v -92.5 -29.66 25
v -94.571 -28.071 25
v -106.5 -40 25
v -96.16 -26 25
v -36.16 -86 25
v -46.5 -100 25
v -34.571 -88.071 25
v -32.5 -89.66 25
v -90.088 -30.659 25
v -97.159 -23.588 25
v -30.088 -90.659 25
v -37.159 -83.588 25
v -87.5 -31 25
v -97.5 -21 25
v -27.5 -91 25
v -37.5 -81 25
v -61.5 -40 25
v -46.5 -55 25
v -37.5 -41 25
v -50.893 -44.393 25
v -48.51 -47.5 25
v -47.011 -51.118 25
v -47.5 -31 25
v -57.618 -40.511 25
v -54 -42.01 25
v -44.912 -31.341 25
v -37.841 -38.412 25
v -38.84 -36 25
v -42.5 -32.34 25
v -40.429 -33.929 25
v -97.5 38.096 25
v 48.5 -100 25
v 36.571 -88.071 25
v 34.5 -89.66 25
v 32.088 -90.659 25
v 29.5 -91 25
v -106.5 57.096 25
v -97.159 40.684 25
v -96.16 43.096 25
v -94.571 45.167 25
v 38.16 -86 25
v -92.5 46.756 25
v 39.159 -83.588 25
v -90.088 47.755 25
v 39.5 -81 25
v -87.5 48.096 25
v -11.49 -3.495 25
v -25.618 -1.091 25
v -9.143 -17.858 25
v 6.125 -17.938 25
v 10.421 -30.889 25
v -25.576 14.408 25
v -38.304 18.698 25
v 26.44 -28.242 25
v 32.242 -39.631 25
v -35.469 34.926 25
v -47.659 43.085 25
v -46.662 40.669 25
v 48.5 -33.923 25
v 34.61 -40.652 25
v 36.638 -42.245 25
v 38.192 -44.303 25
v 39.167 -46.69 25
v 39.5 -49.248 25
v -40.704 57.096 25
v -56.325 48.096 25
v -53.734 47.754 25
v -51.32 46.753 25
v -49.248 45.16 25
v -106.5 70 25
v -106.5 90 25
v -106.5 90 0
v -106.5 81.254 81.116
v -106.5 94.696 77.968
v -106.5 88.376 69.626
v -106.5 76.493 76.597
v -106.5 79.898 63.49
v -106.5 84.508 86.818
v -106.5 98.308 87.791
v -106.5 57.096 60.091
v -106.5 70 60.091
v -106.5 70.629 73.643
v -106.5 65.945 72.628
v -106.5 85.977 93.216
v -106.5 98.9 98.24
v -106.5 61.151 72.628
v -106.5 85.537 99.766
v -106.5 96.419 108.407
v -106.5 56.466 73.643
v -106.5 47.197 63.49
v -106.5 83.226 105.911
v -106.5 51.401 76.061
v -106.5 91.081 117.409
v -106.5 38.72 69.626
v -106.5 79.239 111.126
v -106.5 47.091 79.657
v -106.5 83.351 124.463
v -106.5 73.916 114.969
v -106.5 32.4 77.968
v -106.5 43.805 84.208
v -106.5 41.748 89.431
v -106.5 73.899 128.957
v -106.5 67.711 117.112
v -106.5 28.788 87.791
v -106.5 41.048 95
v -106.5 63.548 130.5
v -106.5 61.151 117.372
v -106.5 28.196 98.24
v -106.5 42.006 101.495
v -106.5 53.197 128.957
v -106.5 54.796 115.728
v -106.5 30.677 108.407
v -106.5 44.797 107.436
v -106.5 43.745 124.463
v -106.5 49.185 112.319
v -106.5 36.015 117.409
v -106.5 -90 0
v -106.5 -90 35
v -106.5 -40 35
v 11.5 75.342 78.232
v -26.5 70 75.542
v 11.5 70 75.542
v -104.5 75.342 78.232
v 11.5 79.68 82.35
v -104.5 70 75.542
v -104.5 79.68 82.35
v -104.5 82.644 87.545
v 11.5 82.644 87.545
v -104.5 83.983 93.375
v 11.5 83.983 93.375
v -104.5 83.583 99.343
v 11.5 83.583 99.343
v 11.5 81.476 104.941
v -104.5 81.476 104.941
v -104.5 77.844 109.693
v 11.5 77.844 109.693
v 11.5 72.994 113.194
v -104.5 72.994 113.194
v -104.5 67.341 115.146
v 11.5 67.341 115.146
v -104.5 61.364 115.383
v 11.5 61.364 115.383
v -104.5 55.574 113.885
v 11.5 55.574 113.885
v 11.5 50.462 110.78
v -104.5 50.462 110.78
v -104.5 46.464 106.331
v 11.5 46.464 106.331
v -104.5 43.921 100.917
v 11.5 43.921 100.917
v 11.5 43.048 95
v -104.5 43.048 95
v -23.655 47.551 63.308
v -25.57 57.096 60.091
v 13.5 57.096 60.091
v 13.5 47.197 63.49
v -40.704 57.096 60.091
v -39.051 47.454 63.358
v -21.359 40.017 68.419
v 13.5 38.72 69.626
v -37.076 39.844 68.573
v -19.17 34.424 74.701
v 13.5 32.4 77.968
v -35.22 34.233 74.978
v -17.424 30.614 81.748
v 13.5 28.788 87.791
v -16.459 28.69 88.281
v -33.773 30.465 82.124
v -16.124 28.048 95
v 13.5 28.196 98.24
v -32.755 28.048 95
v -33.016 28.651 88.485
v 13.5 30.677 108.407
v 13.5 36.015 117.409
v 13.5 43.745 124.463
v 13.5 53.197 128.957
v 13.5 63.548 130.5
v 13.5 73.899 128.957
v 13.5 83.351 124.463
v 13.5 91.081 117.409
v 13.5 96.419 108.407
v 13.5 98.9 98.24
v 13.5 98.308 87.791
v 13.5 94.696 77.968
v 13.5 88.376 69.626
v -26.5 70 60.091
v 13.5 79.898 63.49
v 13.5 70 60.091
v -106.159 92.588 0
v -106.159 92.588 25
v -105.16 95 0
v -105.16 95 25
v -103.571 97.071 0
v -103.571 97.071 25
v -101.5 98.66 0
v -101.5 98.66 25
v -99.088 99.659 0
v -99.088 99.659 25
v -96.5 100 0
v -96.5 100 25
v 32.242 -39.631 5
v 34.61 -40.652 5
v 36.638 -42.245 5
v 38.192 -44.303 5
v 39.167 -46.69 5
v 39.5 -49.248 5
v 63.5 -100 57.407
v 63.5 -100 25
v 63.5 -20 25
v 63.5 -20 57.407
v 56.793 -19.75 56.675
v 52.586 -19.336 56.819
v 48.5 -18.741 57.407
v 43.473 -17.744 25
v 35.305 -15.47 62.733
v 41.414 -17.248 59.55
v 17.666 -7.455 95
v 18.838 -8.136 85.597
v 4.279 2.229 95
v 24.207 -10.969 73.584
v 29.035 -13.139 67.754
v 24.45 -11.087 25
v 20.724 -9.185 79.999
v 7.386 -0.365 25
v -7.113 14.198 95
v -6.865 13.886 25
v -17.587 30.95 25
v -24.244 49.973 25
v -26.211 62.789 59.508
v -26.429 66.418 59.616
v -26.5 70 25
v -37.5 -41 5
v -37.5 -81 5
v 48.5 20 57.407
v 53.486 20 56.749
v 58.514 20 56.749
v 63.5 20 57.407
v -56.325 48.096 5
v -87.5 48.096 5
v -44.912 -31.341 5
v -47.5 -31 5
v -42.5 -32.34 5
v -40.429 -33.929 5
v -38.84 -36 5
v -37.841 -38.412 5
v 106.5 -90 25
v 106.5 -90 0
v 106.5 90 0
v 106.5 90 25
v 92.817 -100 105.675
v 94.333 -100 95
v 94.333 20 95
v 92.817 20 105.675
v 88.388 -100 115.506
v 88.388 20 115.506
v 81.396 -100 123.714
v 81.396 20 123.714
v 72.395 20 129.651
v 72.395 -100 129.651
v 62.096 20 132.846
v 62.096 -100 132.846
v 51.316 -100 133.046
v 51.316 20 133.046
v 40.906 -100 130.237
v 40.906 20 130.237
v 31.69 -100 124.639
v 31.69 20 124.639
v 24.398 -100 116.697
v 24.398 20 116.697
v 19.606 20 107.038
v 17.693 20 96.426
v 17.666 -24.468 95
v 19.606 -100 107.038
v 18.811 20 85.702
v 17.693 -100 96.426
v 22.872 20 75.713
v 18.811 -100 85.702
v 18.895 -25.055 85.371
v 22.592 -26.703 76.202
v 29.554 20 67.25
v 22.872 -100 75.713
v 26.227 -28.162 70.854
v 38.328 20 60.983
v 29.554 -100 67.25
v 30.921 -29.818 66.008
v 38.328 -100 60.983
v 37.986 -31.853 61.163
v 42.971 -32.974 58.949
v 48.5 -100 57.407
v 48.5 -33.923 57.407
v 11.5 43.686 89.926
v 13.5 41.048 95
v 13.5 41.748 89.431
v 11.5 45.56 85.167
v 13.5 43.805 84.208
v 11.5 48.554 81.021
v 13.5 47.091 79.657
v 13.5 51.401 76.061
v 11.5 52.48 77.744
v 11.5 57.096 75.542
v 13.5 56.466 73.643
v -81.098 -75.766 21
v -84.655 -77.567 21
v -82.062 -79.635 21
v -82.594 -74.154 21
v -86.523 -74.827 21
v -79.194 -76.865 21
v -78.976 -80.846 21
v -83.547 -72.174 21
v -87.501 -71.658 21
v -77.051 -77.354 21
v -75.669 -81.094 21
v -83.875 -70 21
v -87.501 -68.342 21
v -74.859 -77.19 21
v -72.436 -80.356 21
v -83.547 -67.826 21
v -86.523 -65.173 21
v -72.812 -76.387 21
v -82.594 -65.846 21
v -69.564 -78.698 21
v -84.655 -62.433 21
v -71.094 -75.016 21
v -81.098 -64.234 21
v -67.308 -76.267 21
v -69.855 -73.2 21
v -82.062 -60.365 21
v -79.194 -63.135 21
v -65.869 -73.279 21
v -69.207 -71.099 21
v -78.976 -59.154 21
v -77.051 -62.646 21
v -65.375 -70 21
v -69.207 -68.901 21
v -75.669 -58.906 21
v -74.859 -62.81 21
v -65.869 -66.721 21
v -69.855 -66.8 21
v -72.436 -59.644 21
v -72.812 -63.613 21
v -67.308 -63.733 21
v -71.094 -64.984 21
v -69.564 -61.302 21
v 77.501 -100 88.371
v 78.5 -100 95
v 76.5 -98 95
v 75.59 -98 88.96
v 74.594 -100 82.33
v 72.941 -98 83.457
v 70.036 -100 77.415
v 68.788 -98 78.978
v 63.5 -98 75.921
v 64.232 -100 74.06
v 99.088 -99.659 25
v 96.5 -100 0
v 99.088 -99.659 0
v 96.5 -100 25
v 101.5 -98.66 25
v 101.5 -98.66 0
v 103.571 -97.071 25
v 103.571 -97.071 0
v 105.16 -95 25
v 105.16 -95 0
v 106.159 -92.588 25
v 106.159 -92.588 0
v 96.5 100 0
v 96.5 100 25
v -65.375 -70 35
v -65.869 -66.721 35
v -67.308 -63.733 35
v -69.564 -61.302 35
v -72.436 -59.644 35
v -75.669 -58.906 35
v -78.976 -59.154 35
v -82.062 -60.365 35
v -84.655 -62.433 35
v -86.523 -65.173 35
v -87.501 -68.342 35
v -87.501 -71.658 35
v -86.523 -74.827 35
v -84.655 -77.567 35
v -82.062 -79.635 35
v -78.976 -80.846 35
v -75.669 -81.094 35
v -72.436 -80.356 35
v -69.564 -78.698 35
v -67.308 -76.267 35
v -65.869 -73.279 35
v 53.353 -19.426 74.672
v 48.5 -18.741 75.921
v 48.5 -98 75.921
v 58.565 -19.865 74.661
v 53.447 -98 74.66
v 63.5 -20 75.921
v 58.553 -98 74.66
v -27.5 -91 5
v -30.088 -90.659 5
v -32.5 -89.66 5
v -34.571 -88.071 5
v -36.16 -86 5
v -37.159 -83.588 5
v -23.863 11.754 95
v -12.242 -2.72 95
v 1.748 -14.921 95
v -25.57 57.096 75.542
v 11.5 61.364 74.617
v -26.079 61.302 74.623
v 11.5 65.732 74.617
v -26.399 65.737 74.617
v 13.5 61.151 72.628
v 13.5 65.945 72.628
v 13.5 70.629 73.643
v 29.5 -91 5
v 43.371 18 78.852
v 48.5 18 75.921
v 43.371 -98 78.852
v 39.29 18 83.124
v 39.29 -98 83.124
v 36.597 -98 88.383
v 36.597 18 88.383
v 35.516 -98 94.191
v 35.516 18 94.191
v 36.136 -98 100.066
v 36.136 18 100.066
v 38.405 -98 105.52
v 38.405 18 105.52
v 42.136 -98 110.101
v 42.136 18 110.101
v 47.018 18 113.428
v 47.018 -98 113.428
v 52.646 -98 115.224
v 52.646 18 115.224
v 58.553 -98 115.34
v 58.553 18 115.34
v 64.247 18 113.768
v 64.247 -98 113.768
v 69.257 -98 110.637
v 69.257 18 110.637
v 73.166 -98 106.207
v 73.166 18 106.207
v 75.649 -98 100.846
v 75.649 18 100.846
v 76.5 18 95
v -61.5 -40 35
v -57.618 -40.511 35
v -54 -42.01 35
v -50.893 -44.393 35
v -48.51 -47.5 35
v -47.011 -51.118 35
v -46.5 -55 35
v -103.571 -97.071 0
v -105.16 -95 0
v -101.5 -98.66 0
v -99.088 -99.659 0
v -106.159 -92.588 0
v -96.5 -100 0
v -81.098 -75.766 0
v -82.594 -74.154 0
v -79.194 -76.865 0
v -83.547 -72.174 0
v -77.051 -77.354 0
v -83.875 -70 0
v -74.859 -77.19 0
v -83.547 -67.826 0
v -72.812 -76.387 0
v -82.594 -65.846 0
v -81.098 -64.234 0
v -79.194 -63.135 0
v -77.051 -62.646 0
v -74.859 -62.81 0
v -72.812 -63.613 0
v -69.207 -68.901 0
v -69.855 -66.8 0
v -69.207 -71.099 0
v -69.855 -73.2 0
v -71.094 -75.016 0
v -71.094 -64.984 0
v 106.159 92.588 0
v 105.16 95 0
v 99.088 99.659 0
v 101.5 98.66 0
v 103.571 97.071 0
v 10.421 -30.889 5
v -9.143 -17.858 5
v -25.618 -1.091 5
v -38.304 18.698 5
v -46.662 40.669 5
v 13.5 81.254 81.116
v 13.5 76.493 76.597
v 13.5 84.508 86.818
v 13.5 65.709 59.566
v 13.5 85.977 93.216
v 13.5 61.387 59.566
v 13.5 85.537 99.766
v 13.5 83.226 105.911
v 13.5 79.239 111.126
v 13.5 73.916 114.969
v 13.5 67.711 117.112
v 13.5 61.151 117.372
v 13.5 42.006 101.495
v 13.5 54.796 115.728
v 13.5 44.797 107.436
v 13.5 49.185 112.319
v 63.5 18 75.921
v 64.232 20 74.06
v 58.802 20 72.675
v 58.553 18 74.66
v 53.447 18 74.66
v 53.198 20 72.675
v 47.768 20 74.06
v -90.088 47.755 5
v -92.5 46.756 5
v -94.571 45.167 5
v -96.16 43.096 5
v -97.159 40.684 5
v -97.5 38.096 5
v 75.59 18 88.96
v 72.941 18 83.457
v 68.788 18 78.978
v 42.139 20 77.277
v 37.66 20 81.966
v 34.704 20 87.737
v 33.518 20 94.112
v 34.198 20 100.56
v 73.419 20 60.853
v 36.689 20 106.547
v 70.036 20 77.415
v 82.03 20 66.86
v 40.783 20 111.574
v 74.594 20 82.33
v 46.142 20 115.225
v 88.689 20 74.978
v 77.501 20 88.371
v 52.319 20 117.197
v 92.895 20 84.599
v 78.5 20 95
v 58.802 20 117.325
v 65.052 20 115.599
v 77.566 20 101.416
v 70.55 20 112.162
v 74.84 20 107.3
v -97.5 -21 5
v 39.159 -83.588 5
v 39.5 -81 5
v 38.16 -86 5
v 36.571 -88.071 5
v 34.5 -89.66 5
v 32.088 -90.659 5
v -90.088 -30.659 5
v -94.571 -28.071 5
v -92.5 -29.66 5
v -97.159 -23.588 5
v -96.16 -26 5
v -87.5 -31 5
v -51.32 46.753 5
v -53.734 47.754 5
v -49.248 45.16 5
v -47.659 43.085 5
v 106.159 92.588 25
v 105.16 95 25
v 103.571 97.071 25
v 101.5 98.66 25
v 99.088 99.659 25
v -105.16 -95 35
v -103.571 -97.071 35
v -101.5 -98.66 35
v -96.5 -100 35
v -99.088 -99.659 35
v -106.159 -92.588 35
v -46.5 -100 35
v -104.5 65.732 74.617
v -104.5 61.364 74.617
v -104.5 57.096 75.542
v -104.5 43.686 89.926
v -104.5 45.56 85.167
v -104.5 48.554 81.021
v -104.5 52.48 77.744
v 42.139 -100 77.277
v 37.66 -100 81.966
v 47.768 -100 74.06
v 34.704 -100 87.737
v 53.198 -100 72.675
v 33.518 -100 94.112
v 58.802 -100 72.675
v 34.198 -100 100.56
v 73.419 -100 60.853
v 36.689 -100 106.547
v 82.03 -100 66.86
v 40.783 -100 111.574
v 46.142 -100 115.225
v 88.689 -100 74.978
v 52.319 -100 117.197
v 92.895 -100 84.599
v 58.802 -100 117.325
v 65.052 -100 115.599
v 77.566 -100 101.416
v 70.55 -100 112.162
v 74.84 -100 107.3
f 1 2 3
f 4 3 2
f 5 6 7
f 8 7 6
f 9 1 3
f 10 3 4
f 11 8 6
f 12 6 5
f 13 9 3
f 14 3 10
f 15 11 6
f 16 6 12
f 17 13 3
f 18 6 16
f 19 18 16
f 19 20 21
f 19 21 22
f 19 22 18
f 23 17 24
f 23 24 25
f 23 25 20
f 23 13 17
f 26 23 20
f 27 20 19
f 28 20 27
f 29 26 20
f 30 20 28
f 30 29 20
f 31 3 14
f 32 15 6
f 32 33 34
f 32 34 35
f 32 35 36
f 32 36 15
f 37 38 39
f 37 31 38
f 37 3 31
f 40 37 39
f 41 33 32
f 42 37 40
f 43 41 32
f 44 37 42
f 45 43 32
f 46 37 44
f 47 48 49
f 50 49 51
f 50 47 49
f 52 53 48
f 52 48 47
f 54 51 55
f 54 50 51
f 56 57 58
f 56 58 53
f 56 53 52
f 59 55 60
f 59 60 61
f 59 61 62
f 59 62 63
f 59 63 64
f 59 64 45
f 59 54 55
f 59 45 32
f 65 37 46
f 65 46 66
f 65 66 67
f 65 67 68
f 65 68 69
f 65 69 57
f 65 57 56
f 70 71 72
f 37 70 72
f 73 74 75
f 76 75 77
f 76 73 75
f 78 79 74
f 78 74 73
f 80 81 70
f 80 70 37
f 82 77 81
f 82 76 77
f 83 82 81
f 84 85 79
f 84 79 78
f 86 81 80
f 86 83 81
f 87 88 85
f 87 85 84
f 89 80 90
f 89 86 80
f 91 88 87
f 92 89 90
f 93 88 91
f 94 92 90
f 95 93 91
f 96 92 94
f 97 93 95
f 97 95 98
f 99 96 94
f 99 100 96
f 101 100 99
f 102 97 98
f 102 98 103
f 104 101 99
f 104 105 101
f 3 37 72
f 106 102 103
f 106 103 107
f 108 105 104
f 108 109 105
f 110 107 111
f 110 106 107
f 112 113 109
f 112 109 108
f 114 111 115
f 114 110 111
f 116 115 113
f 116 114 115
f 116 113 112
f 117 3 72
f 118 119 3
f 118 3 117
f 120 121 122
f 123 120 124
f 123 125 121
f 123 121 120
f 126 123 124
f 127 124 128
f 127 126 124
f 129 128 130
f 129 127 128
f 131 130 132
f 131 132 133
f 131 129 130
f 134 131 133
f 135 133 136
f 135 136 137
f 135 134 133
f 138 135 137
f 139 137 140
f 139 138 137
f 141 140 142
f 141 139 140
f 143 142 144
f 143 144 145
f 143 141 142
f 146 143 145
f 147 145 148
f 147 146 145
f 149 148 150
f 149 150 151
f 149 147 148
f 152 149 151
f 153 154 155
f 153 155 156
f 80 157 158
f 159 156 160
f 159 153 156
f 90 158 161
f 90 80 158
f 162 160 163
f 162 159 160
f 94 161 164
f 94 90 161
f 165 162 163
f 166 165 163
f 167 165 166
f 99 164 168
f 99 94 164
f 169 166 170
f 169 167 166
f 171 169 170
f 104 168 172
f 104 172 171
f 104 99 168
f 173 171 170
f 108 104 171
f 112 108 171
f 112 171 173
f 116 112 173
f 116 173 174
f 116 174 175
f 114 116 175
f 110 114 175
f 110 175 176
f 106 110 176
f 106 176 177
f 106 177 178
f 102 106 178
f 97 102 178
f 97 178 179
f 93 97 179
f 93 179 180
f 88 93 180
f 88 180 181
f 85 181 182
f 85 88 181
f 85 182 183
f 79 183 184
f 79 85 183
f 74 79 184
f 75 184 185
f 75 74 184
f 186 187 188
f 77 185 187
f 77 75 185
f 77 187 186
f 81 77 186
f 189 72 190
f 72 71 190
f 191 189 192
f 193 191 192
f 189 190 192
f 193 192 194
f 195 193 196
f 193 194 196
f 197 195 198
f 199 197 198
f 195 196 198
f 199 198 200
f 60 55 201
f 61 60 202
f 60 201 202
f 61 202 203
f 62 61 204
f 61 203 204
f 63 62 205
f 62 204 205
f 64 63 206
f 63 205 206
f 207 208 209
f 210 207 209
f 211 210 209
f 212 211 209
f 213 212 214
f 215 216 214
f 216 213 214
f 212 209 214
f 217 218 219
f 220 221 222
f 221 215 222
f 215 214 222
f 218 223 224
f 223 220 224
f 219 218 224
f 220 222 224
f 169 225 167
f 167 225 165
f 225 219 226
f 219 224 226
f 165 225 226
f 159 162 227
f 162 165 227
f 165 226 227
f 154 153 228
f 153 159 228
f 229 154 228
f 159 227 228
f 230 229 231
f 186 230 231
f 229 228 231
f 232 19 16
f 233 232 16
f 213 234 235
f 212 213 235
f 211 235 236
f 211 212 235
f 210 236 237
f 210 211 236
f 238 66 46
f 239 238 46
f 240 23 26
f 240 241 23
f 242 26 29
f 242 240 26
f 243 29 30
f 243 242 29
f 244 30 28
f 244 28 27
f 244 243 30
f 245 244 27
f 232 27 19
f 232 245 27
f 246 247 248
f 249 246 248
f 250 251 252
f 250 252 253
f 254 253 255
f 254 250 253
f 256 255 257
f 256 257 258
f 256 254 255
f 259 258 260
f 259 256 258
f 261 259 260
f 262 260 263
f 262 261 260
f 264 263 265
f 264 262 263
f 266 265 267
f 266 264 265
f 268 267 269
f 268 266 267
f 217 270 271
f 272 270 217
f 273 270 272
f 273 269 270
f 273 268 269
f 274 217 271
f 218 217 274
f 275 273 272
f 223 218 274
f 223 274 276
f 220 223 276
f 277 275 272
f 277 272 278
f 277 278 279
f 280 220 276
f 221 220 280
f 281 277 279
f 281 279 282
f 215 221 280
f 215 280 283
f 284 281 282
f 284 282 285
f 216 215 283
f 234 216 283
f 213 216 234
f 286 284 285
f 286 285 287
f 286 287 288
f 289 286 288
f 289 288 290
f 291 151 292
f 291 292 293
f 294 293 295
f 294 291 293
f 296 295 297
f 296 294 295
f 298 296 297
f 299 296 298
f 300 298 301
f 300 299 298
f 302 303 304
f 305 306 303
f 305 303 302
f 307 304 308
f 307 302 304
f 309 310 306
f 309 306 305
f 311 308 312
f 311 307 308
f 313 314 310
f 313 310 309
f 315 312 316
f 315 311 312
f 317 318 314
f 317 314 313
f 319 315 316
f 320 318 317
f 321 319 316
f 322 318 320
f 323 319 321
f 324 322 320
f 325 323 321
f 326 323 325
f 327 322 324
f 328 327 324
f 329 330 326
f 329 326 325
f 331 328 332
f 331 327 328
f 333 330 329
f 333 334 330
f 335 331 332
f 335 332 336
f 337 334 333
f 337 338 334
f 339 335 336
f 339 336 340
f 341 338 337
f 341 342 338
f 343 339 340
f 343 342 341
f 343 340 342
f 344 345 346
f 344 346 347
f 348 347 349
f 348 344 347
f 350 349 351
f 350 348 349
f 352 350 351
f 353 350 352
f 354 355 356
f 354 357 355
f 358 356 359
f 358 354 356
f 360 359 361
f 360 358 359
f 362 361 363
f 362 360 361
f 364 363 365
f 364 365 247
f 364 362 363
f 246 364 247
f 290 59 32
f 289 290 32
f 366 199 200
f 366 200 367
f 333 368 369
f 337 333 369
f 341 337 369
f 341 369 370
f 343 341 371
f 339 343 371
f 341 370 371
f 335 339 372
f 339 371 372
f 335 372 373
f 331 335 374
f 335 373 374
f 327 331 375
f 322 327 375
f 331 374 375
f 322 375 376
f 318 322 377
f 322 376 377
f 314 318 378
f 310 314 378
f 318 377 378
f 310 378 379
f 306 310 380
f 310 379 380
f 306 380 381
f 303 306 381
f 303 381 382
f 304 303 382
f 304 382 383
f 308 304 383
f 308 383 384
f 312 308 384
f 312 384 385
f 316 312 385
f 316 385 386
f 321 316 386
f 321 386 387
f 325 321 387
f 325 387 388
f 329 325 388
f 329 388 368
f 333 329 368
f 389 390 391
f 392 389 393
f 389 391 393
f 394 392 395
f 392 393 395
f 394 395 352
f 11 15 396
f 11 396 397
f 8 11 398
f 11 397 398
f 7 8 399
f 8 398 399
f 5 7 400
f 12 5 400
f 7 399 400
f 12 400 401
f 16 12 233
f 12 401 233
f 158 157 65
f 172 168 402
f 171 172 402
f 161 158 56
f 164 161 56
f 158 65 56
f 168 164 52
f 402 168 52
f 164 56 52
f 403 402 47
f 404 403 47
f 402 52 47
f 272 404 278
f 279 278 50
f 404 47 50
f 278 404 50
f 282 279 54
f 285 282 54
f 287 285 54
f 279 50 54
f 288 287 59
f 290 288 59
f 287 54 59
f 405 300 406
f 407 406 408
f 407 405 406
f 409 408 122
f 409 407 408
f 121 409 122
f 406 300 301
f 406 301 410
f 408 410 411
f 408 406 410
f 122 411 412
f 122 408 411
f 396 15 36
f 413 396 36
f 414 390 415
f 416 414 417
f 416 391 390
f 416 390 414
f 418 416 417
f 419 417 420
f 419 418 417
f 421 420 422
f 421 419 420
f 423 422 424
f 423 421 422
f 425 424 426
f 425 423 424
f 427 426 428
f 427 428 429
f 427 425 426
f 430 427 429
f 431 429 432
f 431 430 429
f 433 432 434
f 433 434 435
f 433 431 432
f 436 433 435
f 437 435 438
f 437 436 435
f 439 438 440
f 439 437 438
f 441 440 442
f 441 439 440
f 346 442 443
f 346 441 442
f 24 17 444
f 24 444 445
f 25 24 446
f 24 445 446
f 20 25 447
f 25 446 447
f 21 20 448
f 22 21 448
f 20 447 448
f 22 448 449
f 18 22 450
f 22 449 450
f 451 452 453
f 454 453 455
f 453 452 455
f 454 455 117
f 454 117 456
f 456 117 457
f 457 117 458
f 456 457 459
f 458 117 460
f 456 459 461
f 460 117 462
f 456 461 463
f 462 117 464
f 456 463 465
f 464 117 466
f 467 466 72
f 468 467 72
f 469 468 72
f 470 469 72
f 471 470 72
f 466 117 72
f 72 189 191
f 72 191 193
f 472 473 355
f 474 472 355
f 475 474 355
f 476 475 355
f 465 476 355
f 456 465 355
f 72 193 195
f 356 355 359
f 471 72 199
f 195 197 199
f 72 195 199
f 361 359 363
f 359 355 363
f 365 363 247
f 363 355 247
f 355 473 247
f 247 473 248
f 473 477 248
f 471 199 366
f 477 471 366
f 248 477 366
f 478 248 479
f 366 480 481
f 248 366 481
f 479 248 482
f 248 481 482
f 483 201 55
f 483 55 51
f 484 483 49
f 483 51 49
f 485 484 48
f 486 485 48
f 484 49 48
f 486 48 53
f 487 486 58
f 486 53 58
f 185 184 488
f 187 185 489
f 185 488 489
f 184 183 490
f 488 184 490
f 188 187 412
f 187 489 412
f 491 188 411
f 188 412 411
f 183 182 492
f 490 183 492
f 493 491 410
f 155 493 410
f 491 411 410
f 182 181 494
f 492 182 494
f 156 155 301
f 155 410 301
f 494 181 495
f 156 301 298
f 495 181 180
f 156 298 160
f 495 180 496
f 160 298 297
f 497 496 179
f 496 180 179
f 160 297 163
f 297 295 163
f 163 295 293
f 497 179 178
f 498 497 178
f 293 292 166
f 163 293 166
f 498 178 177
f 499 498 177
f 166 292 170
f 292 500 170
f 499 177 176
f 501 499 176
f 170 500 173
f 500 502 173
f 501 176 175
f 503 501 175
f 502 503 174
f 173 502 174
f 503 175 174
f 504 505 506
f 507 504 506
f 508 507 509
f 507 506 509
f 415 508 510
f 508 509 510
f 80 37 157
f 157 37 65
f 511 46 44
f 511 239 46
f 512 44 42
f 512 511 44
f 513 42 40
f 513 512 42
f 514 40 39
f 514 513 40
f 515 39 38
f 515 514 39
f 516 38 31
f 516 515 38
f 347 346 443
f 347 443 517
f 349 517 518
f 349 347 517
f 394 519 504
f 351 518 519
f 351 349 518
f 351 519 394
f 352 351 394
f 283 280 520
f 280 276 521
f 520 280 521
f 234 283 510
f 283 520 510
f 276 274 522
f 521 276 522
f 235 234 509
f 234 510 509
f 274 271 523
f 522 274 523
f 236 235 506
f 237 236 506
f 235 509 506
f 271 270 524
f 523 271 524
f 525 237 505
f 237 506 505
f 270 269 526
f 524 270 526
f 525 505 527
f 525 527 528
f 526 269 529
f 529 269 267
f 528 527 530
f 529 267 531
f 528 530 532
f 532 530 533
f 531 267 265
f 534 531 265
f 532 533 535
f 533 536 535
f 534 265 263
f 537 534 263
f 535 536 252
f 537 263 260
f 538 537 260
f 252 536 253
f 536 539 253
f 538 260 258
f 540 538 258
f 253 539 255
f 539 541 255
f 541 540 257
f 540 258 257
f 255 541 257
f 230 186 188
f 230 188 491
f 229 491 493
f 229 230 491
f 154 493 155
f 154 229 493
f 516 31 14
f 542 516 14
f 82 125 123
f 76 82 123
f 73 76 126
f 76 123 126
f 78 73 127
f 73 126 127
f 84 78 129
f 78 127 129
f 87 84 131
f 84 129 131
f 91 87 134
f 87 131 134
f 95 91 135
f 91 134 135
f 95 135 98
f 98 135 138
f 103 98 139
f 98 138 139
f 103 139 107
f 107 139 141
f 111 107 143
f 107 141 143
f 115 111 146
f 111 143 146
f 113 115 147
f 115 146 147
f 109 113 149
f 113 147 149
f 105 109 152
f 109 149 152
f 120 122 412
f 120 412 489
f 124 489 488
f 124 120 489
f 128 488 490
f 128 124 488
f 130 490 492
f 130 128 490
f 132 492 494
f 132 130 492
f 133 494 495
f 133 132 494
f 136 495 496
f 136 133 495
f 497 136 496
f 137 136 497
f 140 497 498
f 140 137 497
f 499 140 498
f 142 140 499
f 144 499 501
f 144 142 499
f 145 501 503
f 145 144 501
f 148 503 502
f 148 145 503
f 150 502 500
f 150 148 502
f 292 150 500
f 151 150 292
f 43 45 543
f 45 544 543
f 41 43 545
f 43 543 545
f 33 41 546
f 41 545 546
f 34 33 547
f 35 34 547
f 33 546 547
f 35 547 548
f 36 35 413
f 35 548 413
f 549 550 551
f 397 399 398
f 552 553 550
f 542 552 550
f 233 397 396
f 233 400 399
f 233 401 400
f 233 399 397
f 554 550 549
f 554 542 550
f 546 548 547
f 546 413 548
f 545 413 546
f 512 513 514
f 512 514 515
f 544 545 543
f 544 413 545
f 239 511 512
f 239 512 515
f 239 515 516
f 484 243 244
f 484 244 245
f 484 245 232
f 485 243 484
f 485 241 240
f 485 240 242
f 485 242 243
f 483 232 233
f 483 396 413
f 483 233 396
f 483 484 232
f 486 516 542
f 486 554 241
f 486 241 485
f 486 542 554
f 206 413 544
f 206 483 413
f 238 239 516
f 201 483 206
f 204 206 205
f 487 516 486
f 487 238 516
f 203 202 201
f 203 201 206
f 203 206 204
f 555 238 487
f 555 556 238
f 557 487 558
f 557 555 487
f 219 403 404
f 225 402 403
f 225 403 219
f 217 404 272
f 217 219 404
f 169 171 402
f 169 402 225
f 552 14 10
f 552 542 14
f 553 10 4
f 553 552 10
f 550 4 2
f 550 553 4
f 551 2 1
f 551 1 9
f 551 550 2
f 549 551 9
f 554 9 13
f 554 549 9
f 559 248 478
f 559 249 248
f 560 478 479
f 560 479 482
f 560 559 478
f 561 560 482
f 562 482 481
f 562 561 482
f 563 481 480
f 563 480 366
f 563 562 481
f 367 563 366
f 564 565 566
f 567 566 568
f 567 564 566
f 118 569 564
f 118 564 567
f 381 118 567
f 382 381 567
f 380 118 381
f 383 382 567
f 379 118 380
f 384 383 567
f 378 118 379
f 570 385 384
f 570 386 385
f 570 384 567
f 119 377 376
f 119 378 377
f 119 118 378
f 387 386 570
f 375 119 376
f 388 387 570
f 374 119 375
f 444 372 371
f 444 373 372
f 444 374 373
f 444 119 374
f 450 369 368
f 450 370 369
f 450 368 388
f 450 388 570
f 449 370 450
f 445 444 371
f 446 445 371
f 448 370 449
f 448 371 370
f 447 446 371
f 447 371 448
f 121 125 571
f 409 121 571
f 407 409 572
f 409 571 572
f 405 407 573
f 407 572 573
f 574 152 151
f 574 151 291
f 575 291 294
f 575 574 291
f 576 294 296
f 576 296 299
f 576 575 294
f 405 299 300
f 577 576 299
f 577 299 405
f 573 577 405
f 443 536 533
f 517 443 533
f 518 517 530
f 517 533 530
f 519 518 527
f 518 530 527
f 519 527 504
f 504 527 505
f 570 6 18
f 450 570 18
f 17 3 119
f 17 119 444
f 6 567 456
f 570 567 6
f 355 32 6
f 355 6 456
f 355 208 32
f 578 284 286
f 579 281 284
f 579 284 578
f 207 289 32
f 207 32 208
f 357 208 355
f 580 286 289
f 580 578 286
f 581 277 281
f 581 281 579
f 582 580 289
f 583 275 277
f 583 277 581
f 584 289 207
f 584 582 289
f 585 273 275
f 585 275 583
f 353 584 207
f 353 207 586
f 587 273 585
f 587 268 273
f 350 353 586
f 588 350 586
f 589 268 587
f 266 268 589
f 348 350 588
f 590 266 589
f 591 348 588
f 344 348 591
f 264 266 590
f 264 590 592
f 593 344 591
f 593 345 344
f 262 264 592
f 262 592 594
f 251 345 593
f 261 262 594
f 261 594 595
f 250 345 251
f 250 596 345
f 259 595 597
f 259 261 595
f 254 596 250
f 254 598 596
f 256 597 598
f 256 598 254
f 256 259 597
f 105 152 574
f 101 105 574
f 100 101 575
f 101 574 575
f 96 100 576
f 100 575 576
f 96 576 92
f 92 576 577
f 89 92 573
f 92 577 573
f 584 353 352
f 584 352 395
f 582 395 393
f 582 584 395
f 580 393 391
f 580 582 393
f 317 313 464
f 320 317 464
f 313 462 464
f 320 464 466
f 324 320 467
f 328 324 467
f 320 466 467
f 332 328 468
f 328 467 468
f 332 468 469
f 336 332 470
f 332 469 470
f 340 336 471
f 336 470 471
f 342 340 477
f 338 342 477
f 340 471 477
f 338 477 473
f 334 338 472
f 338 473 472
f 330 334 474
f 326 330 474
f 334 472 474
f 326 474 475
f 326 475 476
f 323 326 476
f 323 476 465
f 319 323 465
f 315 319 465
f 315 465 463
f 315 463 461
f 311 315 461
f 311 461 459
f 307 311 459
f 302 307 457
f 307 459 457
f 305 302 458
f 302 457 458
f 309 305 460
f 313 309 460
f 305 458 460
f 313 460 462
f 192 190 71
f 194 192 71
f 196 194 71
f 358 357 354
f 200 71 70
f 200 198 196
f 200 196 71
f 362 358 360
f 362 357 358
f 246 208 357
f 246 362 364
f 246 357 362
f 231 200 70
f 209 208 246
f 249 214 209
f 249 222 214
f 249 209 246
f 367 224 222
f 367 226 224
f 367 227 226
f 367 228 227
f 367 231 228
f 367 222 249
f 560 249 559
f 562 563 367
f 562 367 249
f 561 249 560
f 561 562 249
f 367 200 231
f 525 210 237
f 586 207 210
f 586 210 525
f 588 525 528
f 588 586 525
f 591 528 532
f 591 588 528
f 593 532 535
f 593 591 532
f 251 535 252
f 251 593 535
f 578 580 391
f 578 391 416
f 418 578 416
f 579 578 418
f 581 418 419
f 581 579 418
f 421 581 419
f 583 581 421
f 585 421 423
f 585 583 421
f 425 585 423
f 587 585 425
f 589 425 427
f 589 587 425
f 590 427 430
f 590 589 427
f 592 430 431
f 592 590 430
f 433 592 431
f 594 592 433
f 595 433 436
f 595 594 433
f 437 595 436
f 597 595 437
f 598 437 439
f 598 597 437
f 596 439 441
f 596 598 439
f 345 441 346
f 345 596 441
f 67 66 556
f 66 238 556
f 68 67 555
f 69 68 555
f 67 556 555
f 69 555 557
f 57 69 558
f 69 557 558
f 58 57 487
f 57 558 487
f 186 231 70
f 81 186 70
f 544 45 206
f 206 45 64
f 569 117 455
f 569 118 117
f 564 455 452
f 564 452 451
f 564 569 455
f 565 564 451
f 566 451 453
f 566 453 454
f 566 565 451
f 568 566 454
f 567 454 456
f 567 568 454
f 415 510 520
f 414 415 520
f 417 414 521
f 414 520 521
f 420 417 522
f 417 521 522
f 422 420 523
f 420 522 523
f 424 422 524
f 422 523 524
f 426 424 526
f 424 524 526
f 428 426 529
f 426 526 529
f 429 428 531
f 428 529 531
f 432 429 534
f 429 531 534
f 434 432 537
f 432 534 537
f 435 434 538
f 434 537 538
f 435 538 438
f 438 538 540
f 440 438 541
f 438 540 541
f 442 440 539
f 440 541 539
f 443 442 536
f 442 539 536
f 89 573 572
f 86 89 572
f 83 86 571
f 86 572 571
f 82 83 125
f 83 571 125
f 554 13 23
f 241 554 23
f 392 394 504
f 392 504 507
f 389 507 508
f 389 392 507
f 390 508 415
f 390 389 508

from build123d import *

# Parameters (mm, degrees)
F0_W            = 213
F0_H            = 200
F1_DEPTH        = 25
F2_W            = 60
F2_H            = 60
F3_DEPTH        = 10
F4_R            = 10
F5_R            = 15
F6_DEPTH        = 20
F7_DEPTH        = 70
F8_R            = 10
F10_DEPTH       = 120
F11_DEPTH       = 120
F12_SIZE        = 2
F14_DEPTH       = 120
F15_DEPTH       = 120
F16_SIZE        = 2
F18_D           = 14.75
F18_CBORE_D     = 22.25
F18_CBORE_DEPTH = 14
F19_SIZE        = 2
F20_SIZE        = 2


with BuildPart() as f1:
    # F0 (on Top) → F1 (new body)
    with BuildSketch(Plane.XY):
        Rectangle(F0_W, F0_H)
    extrude(amount=F1_DEPTH)

    # F2 (on face) → F3 (join)
    with BuildSketch(Plane.XY.offset(25)):
        with Locations((-76.5, -70)):
            Rectangle(F2_W, F2_H)
    extrude(amount=F3_DEPTH)

    # F4
    f4_edges = [f1.edges().sort_by_distance(p)[0] for p in [
        (-106.5, -100, 17.5),
        (106.5, -100, 12.5),
        (106.5, 100, 12.5),
        (-106.5, 100, 12.5),
    ]]
    fillet(f4_edges, radius=F4_R)

    # F5
    f5_edges = [f1.edges().sort_by_distance(p)[0] for p in [
        (-46.5, -40, 30),
    ]]
    fillet(f5_edges, radius=F5_R)

    # F2 (on face) → F6 (cut)
    with BuildSketch(Plane.XY.offset(25)):
        with BuildLine():
            Line((-48.3758740693, 48.0959181604), (-97.5, 48.0959181604))
            Line((-97.5, 48.0959181604), (-97.5, -31))
            Line((-97.5, -31), (-37.5, -31))
            Line((-37.5, -31), (-37.5, -91))
            Line((-37.5, -91), (39.5, -91))
            Line((39.5, -91), (39.5, -41.445053726))
            ThreePointArc((39.5, -41.445053726), (-17.8631347732, -9.8501114582), (-48.3758740693, 48.0959181604))
        make_face()
    extrude(amount=-F6_DEPTH, mode=Mode.SUBTRACT)

    # F2 (on face) → F7 (join)
    with BuildSketch(Plane.XY.offset(25)):
        with BuildLine():
            Line((48.5, -33.9230484541), (48.5, -100))
            Line((48.5, -100), (63.5, -100))
            Line((63.5, -100), (63.5, -20))
            ThreePointArc((63.5, -20), (-0.1396103068, 6.3603896932), (-26.5, 70))
            Line((-26.5, 70), (-106.5, 70))
            Line((-106.5, 70), (-106.5, 57.0959181604))
            Line((-106.5, 57.0959181604), (-40.7040530492, 57.0959181604))
            ThreePointArc((-40.7040530492, 57.0959181604), (-11.4900969244, -3.4947982055), (48.5, -33.9230484541))
        make_face()
    extrude(amount=F7_DEPTH)

    # F8
    f8_edges = [f1.edges().sort_by_distance(p)[0] for p in [
        (-48.375874, 48.095918, 15),
        (39.5, -41.445054, 15),
        (-37.5, -31, 15),
        (-97.5, 48.095918, 15),
        (39.5, -91, 15),
        (-37.5, -91, 15),
        (-97.5, -31, 15),
    ]]
    fillet(f8_edges, radius=F8_R)

    # F9 (on face) → F10 (cut)
    with BuildSketch(Plane(origin=(-106.5, 0, 0), x_dir=(0, -1, 0), z_dir=(-1, 0, 0))):
        with BuildLine():
            ThreePointArc((-43.0479590802, 95), (-75.5476082656, 111.621023417), (-70, 75.5418097458))
            Line((-70, 75.5418097458), (-70, 95))
            Line((-70, 95), (-57.0959181604, 95))
            Line((-57.0959181604, 95), (-57.0959181604, 75.5418097458))
            ThreePointArc((-57.0959181604, 75.5418097458), (-46.9269356632, 83.0003508146), (-43.0479590802, 95))
        make_face()
        with BuildLine():
            Line((-70, 95), (-70, 75.5418097458))
            ThreePointArc((-70, 75.5418097458), (-63.5479590802, 74.5), (-57.0959181604, 75.5418097458))
            Line((-57.0959181604, 75.5418097458), (-57.0959181604, 95))
            Line((-57.0959181604, 95), (-70, 95))
        make_face()
        with BuildLine():
            ThreePointArc((-57.0959181604, 60.09124511), (-36.2597065468, 72.2931447868), (-28.0479590802, 95))
            ThreePointArc((-28.0479590802, 95), (-86.2548142934, 122.2882525334), (-70, 60.09124511))
            Line((-70, 60.09124511), (-70, 75.5418097458))
            ThreePointArc((-70, 75.5418097458), (-75.5476082656, 111.621023417), (-43.0479590802, 95))
            ThreePointArc((-43.0479590802, 95), (-46.9269356632, 83.0003508146), (-57.0959181604, 75.5418097458))
            Line((-57.0959181604, 75.5418097458), (-57.0959181604, 60.09124511))
        make_face()
    extrude(amount=-F10_DEPTH, mode=Mode.SUBTRACT)

    # F9 (on face) → F11 (join)
    with BuildSketch(Plane(origin=(-106.5, 0, 0), x_dir=(0, -1, 0), z_dir=(-1, 0, 0))):
        with BuildLine():
            ThreePointArc((-57.0959181604, 60.09124511), (-36.2597065468, 72.2931447868), (-28.0479590802, 95))
            ThreePointArc((-28.0479590802, 95), (-86.2548142934, 122.2882525334), (-70, 60.09124511))
            Line((-70, 60.09124511), (-70, 75.5418097458))
            ThreePointArc((-70, 75.5418097458), (-75.5476082656, 111.621023417), (-43.0479590802, 95))
            ThreePointArc((-43.0479590802, 95), (-46.9269356632, 83.0003508146), (-57.0959181604, 75.5418097458))
            Line((-57.0959181604, 75.5418097458), (-57.0959181604, 60.09124511))
        make_face()
        with BuildLine():
            Line((-70, 75.5418097458), (-70, 60.09124511))
            ThreePointArc((-70, 60.09124511), (-63.5479590802, 59.5), (-57.0959181604, 60.09124511))
            Line((-57.0959181604, 60.09124511), (-57.0959181604, 75.5418097458))
            ThreePointArc((-57.0959181604, 75.5418097458), (-63.5479590802, 74.5), (-70, 75.5418097458))
        make_face()
    extrude(amount=-F11_DEPTH)

    # F12
    f12_edges = [f1.edges().sort_by_distance(p)[0] for p in [
        (-106.5, 84.047959, 95),
    ]]
    chamfer(f12_edges, length=F12_SIZE)

    # F13 (on face) → F14 (cut)
    with BuildSketch(Plane.XZ.offset(100)):
        with BuildLine():
            ThreePointArc((76.5, 95), (44.4566036194, 111.9410743461), (48.5, 75.9212159717))
            Line((48.5, 75.9212159717), (48.5, 95))
            Line((48.5, 95), (63.5, 95))
            Line((63.5, 95), (63.5, 75.9212159717))
            ThreePointArc((63.5, 75.9212159717), (72.9410743461, 83.4566036194), (76.5, 95))
        make_face()
        with BuildLine():
            Line((48.5, 95), (48.5, 75.9212159717))
            ThreePointArc((48.5, 75.9212159717), (56, 74.5), (63.5, 75.9212159717))
            Line((63.5, 75.9212159717), (63.5, 95))
            Line((63.5, 95), (48.5, 95))
        make_face()
    extrude(amount=-F14_DEPTH, mode=Mode.SUBTRACT)

    # F13 (on face) → F15 (join)
    with BuildSketch(Plane.XZ.offset(100)):
        with BuildLine():
            ThreePointArc((63.5, 57.4073514866), (85.6391503948, 70.6899612068), (94.3335, 95))
            ThreePointArc((94.3335, 95), (31.6899612068, 124.6391503948), (48.5, 57.4073514866))
            Line((48.5, 57.4073514866), (48.5, 75.9212159717))
            ThreePointArc((48.5, 75.9212159717), (44.4566036194, 111.9410743461), (76.5, 95))
            ThreePointArc((76.5, 95), (72.9410743461, 83.4566036194), (63.5, 75.9212159717))
            Line((63.5, 75.9212159717), (63.5, 57.4073514866))
        make_face()
        with BuildLine():
            Line((48.5, 75.9212159717), (48.5, 57.4073514866))
            ThreePointArc((48.5, 57.4073514866), (56, 56.6665), (63.5, 57.4073514866))
            Line((63.5, 57.4073514866), (63.5, 75.9212159717))
            ThreePointArc((63.5, 75.9212159717), (56, 74.5), (48.5, 75.9212159717))
        make_face()
    extrude(amount=-F15_DEPTH)

    # F16
    f16_edges = [f1.edges().sort_by_distance(p)[0] for p in [
        (35.5, -100, 95),
    ]]
    chamfer(f16_edges, length=F16_SIZE)

    # F18 (through all)
    with Locations(Plane.XY.offset(35)):
        with Locations((-76.5, -70)):
            CounterBoreHole(F18_D / 2, F18_CBORE_D / 2, F18_CBORE_DEPTH)

    # F19
    f19_edges = [f1.edges().sort_by_distance(p)[0] for p in [
        (35.5, 20, 95),
    ]]
    chamfer(f19_edges, length=F19_SIZE)

    # F20
    f20_edges = [f1.edges().sort_by_distance(p)[0] for p in [
        (13.5, 84.047959, 95),
    ]]
    chamfer(f20_edges, length=F20_SIZE)


solid = f1.part
